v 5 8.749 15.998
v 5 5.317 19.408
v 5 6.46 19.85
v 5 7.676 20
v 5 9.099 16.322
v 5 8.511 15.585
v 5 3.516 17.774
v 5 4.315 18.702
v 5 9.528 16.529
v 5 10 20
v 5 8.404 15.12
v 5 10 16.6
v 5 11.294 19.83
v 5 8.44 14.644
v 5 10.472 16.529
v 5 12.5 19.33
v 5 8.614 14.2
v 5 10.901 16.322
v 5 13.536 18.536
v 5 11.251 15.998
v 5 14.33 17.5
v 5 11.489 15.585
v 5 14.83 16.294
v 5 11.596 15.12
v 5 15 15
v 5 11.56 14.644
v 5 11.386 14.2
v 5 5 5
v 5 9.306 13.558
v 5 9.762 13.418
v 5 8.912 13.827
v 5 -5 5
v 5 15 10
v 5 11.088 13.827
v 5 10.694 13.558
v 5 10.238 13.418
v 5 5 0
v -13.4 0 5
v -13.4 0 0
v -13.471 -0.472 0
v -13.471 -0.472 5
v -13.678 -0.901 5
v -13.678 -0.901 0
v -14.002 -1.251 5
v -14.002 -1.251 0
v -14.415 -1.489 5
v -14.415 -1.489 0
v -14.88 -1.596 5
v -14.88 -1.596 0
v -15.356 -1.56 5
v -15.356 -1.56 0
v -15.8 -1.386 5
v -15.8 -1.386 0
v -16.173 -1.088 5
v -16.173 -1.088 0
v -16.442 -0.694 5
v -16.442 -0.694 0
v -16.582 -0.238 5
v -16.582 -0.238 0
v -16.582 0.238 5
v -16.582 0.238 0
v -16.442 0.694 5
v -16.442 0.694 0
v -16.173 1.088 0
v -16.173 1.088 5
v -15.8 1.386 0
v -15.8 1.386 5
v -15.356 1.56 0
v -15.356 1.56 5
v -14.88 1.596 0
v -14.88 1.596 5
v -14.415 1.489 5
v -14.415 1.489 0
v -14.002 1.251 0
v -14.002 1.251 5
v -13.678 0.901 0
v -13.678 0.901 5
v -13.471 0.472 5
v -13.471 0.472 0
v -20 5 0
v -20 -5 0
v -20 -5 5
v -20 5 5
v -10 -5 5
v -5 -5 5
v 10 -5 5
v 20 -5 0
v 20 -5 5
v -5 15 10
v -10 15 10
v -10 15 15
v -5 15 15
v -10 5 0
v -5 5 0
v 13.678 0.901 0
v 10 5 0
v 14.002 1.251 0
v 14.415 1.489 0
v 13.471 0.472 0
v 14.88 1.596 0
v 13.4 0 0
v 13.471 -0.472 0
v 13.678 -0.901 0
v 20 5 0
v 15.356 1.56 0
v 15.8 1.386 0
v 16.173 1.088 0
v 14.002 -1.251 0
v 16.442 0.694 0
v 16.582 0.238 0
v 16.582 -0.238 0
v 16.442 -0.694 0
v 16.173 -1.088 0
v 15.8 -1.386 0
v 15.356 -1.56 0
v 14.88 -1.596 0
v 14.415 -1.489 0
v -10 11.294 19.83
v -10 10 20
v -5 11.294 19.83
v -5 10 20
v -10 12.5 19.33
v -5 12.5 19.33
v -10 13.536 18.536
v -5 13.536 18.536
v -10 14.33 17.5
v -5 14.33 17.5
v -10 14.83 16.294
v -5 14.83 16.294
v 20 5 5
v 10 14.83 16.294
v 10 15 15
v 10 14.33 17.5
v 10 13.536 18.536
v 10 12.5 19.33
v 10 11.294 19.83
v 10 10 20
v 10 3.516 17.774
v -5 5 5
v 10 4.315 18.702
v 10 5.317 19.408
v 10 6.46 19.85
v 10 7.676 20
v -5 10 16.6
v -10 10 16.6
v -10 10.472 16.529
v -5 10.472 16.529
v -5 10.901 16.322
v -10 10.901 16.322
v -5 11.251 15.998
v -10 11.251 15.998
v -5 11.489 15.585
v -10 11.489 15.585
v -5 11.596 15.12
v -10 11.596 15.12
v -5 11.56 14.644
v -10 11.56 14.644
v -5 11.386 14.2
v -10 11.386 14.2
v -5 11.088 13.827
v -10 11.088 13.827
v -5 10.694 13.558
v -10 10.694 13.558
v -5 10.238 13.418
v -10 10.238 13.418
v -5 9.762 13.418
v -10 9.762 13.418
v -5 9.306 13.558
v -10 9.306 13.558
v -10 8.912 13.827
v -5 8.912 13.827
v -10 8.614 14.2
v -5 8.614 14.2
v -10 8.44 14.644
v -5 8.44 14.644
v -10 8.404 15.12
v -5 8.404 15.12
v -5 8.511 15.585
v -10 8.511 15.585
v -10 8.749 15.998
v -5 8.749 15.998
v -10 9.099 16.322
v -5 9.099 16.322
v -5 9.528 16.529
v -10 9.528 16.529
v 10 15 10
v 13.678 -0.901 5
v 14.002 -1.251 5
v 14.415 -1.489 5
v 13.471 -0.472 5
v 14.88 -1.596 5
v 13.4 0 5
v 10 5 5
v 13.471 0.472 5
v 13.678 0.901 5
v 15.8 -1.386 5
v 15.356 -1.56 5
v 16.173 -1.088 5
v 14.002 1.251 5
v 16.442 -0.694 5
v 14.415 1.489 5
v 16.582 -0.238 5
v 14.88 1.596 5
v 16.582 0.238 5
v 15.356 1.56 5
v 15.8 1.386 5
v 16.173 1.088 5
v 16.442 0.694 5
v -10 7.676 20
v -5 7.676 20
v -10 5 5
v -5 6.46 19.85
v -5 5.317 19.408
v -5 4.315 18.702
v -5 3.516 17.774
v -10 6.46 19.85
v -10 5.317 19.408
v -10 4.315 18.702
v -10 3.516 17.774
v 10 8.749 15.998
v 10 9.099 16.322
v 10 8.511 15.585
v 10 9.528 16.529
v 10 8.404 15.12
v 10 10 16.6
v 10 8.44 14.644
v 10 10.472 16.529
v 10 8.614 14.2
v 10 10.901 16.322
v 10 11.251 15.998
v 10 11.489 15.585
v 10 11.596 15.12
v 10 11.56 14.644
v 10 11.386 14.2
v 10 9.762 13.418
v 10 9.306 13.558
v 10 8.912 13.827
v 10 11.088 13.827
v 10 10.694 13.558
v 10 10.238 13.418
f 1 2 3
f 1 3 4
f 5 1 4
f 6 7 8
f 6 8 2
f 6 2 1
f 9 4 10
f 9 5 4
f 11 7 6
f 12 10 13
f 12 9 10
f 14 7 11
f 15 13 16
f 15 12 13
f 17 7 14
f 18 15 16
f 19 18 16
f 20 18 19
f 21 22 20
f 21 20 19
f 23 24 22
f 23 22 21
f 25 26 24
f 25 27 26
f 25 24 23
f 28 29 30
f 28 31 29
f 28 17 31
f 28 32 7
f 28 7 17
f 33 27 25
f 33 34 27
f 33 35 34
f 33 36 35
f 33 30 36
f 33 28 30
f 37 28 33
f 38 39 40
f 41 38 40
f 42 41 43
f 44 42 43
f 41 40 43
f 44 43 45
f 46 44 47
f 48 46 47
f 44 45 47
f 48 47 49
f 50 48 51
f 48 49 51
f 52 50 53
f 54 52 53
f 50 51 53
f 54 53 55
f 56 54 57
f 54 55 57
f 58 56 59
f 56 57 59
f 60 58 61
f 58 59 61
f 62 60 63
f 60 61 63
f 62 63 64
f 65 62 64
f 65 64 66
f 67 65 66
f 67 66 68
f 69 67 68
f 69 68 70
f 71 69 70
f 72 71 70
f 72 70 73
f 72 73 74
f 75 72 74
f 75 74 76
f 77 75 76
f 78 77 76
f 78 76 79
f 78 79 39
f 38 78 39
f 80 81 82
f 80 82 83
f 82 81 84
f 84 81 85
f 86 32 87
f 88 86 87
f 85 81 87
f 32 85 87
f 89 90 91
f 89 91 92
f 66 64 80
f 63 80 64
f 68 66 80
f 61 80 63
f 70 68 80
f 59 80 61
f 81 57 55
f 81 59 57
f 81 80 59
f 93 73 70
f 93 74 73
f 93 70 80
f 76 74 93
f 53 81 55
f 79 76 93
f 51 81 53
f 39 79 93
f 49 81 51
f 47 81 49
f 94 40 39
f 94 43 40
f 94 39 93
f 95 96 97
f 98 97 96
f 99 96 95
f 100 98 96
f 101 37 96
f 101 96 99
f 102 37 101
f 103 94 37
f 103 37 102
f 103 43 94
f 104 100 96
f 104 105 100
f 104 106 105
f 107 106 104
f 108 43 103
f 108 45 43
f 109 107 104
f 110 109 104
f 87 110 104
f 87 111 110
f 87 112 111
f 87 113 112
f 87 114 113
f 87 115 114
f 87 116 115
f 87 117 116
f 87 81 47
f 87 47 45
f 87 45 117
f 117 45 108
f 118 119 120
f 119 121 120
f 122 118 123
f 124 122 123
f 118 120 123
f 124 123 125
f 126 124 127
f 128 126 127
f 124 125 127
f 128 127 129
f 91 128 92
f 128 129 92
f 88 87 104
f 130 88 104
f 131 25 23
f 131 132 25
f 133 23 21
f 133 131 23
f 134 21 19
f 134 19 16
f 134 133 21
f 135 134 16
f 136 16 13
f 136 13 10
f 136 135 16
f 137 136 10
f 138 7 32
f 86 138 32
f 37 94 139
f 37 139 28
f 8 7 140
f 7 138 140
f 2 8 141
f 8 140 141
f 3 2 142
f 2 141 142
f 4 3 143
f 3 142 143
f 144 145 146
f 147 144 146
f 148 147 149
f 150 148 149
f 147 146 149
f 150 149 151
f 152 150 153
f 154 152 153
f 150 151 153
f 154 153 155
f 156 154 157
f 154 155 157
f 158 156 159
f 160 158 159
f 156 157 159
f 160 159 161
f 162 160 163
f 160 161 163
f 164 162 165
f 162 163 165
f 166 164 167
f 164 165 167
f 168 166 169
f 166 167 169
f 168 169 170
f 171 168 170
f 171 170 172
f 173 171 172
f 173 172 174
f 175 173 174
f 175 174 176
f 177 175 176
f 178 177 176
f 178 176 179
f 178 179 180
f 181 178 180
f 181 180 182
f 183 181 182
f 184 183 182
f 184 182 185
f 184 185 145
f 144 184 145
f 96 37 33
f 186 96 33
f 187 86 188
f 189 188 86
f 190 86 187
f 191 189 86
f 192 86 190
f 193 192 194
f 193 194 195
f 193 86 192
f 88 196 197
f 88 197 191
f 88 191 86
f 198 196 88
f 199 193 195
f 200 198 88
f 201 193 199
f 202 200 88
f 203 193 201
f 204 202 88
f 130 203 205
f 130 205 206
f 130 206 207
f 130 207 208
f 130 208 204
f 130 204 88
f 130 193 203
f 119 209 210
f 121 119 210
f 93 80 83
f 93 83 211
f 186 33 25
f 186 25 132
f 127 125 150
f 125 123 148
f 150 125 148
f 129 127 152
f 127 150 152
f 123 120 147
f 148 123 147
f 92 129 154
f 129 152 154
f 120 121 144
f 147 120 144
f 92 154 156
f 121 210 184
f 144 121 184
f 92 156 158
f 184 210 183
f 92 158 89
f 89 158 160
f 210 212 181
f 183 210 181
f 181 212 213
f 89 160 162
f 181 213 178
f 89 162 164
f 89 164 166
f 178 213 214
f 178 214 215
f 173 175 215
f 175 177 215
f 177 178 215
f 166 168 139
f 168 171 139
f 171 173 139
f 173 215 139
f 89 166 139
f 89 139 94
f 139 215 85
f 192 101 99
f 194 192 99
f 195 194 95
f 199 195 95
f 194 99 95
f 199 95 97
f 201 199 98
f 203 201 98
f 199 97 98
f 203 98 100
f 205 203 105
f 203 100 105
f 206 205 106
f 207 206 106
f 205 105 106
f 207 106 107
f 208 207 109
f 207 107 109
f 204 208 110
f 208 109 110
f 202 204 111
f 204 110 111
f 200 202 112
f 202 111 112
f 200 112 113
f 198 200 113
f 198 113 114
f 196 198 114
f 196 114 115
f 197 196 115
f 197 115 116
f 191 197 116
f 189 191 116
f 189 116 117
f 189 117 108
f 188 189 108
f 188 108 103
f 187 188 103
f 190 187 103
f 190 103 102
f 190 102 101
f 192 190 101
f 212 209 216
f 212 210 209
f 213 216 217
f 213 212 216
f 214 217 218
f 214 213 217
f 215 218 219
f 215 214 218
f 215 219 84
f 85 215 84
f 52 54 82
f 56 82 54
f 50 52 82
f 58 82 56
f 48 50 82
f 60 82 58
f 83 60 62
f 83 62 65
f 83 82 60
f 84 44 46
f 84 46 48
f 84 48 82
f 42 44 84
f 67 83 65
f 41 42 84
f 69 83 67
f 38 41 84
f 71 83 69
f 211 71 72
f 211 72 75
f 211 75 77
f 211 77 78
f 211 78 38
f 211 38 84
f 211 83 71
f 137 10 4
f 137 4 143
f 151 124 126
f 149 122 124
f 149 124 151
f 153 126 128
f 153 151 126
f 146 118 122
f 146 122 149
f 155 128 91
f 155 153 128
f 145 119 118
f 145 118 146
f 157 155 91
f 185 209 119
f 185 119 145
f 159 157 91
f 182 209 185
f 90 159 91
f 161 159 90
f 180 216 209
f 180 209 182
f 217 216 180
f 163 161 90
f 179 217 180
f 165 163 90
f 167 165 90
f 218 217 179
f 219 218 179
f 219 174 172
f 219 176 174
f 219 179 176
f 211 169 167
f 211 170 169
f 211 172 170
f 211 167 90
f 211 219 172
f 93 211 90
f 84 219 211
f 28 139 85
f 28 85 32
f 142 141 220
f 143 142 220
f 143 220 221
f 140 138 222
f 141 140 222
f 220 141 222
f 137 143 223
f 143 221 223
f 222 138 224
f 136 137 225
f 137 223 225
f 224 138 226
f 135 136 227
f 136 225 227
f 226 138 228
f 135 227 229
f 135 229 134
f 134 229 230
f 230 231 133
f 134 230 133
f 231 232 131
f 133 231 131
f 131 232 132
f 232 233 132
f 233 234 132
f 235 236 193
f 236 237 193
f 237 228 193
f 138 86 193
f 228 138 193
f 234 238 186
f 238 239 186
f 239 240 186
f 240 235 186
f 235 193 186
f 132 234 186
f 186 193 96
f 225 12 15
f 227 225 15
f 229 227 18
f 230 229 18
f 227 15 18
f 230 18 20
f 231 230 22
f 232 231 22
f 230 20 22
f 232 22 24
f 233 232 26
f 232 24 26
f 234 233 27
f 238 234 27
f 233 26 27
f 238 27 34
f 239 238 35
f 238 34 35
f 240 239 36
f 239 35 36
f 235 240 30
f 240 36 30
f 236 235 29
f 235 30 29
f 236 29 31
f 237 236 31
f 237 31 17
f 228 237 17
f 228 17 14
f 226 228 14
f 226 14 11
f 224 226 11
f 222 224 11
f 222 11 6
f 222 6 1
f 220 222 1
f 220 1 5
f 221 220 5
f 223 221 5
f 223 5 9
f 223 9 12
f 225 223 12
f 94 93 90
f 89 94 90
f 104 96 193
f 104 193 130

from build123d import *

# Parameters (mm, degrees)
SKETCH1_W           = 40
SKETCH1_H           = 10
BOSS_EXTRUDE1_DEPTH = 5
SKETCH2_W           = 5
SKETCH2_H           = 10
BOSS_EXTRUDE2_DEPTH = 15
SKETCH4_R           = 1.6
CUT_EXTRUDE2_DEPTH  = 15
SKETCH5_W           = 5
SKETCH5_H           = 20
BOSS_EXTRUDE3_DEPTH = 10
CUT_EXTRUDE3_REACH  = 41.051
SKETCH6_R           = 1.6
CUT_EXTRUDE4_REACH  = 41.051
FILLET2_R           = 5
CUT_EXTRUDE5_REACH  = 41.051


with BuildPart() as part:
    # Sketch1 → Boss-Extrude1 (new body)
    with BuildSketch(Plane.XY):
        Rectangle(SKETCH1_W, SKETCH1_H)
    extrude(amount=BOSS_EXTRUDE1_DEPTH)

    # Sketch2 → Boss-Extrude2 (add)
    with BuildSketch(Plane.XY.offset(5)):
        with Locations((-7.5, 0)):
            Rectangle(SKETCH2_W, SKETCH2_H)
        with Locations((7.5, 0)):
            Rectangle(SKETCH2_W, SKETCH2_H)
    extrude(amount=BOSS_EXTRUDE2_DEPTH)

    # Sketch4 → Cut-Extrude2 (cut)
    with BuildSketch(Plane(origin=(0, 0, 0), x_dir=(-1, 0, 0), z_dir=(0, 0, -1))):
        with Locations((-15, 0)):
            Circle(SKETCH4_R)
        with Locations(Location((15, 0, 0), (0, 0, 180))):
            Circle(SKETCH4_R)
    extrude(amount=-CUT_EXTRUDE2_DEPTH, mode=Mode.SUBTRACT)

    # Sketch5 → Boss-Extrude3 (add)
    with BuildSketch(Plane(origin=(0, 5, 0), x_dir=(1, 0, 0), z_dir=(0, 1, 0))):
        with Locations((-7.5, -10)):
            Rectangle(SKETCH5_W, SKETCH5_H)
        with Locations((7.5, -10)):
            Rectangle(SKETCH5_W, SKETCH5_H)
    extrude(amount=BOSS_EXTRUDE3_DEPTH)

    # Cut-Extrude3: up to this face of the body (flat: up to its plane)
    cut_extrude3_end = Plane(part.part.faces().sort_by_distance((10, 5.714285714, 11.071428571))[0])
    # Sketch6 → Cut-Extrude3 (cut, up to the picked face)
    with BuildSketch(Plane.ZY.offset(10), mode=Mode.PRIVATE) as cut_extrude3_sk1:
        with Locations((15, 10)):
            Circle(SKETCH6_R)
    cut_extrude3_tool1 = split(extrude(cut_extrude3_sk1.sketch, amount=-CUT_EXTRUDE3_REACH, mode=Mode.PRIVATE), bisect_by=cut_extrude3_end, keep=Keep.BOTH, mode=Mode.PRIVATE)
    add(cut_extrude3_tool1.solids().sort_by(Axis((-10, 10, 15), (1, 0, 0)))[0], mode=Mode.SUBTRACT)

    # Cut-Extrude4: up to this face of the body (flat: up to its plane)
    cut_extrude4_end = Plane(part.part.faces().sort_by_distance((10, 5.613490273, 10.97903275))[0])
    # Sketch7 → Cut-Extrude4 (cut, up to the picked face)
    with BuildSketch(Plane.ZY.offset(10), mode=Mode.PRIVATE) as cut_extrude4_sk1:
        Polygon((20, 5), (5, -5), (20, -5), align=None)
    cut_extrude4_tool1 = split(extrude(cut_extrude4_sk1.sketch, amount=-CUT_EXTRUDE4_REACH, mode=Mode.PRIVATE), bisect_by=cut_extrude4_end, keep=Keep.BOTH, mode=Mode.PRIVATE)
    add(cut_extrude4_tool1.solids().sort_by(Axis((-10, -1.666667, 15), (1, 0, 0)))[0], mode=Mode.SUBTRACT)

    # Fillet2
    fillet2_edges = [part.edges().sort_by_distance(p)[0] for p in [
        (-7.5, 15, 20),
        (7.5, 15, 20),
        (-7.5, 5, 20),
        (7.5, 5, 20),
    ]]
    fillet(fillet2_edges, radius=FILLET2_R)

    # Cut-Extrude5: up to this face of the body (flat: up to its plane)
    cut_extrude5_end = Plane(part.part.faces().sort_by_distance((10, 7.540739084, 9.622610051))[0])
    # Sketch8 → Cut-Extrude5 (cut, up to the picked face)
    with BuildSketch(Plane.ZY.offset(10), mode=Mode.PRIVATE) as cut_extrude5_sk1:
        Polygon((0, 5), (10, 15), (0, 15), align=None)
    cut_extrude5_tool1 = split(extrude(cut_extrude5_sk1.sketch, amount=-CUT_EXTRUDE5_REACH, mode=Mode.PRIVATE), bisect_by=cut_extrude5_end, keep=Keep.BOTH, mode=Mode.PRIVATE)
    add(cut_extrude5_tool1.solids().sort_by(Axis((-10, 11.666667, 3.333333), (1, 0, 0)))[0], mode=Mode.SUBTRACT)


solid = part.part
